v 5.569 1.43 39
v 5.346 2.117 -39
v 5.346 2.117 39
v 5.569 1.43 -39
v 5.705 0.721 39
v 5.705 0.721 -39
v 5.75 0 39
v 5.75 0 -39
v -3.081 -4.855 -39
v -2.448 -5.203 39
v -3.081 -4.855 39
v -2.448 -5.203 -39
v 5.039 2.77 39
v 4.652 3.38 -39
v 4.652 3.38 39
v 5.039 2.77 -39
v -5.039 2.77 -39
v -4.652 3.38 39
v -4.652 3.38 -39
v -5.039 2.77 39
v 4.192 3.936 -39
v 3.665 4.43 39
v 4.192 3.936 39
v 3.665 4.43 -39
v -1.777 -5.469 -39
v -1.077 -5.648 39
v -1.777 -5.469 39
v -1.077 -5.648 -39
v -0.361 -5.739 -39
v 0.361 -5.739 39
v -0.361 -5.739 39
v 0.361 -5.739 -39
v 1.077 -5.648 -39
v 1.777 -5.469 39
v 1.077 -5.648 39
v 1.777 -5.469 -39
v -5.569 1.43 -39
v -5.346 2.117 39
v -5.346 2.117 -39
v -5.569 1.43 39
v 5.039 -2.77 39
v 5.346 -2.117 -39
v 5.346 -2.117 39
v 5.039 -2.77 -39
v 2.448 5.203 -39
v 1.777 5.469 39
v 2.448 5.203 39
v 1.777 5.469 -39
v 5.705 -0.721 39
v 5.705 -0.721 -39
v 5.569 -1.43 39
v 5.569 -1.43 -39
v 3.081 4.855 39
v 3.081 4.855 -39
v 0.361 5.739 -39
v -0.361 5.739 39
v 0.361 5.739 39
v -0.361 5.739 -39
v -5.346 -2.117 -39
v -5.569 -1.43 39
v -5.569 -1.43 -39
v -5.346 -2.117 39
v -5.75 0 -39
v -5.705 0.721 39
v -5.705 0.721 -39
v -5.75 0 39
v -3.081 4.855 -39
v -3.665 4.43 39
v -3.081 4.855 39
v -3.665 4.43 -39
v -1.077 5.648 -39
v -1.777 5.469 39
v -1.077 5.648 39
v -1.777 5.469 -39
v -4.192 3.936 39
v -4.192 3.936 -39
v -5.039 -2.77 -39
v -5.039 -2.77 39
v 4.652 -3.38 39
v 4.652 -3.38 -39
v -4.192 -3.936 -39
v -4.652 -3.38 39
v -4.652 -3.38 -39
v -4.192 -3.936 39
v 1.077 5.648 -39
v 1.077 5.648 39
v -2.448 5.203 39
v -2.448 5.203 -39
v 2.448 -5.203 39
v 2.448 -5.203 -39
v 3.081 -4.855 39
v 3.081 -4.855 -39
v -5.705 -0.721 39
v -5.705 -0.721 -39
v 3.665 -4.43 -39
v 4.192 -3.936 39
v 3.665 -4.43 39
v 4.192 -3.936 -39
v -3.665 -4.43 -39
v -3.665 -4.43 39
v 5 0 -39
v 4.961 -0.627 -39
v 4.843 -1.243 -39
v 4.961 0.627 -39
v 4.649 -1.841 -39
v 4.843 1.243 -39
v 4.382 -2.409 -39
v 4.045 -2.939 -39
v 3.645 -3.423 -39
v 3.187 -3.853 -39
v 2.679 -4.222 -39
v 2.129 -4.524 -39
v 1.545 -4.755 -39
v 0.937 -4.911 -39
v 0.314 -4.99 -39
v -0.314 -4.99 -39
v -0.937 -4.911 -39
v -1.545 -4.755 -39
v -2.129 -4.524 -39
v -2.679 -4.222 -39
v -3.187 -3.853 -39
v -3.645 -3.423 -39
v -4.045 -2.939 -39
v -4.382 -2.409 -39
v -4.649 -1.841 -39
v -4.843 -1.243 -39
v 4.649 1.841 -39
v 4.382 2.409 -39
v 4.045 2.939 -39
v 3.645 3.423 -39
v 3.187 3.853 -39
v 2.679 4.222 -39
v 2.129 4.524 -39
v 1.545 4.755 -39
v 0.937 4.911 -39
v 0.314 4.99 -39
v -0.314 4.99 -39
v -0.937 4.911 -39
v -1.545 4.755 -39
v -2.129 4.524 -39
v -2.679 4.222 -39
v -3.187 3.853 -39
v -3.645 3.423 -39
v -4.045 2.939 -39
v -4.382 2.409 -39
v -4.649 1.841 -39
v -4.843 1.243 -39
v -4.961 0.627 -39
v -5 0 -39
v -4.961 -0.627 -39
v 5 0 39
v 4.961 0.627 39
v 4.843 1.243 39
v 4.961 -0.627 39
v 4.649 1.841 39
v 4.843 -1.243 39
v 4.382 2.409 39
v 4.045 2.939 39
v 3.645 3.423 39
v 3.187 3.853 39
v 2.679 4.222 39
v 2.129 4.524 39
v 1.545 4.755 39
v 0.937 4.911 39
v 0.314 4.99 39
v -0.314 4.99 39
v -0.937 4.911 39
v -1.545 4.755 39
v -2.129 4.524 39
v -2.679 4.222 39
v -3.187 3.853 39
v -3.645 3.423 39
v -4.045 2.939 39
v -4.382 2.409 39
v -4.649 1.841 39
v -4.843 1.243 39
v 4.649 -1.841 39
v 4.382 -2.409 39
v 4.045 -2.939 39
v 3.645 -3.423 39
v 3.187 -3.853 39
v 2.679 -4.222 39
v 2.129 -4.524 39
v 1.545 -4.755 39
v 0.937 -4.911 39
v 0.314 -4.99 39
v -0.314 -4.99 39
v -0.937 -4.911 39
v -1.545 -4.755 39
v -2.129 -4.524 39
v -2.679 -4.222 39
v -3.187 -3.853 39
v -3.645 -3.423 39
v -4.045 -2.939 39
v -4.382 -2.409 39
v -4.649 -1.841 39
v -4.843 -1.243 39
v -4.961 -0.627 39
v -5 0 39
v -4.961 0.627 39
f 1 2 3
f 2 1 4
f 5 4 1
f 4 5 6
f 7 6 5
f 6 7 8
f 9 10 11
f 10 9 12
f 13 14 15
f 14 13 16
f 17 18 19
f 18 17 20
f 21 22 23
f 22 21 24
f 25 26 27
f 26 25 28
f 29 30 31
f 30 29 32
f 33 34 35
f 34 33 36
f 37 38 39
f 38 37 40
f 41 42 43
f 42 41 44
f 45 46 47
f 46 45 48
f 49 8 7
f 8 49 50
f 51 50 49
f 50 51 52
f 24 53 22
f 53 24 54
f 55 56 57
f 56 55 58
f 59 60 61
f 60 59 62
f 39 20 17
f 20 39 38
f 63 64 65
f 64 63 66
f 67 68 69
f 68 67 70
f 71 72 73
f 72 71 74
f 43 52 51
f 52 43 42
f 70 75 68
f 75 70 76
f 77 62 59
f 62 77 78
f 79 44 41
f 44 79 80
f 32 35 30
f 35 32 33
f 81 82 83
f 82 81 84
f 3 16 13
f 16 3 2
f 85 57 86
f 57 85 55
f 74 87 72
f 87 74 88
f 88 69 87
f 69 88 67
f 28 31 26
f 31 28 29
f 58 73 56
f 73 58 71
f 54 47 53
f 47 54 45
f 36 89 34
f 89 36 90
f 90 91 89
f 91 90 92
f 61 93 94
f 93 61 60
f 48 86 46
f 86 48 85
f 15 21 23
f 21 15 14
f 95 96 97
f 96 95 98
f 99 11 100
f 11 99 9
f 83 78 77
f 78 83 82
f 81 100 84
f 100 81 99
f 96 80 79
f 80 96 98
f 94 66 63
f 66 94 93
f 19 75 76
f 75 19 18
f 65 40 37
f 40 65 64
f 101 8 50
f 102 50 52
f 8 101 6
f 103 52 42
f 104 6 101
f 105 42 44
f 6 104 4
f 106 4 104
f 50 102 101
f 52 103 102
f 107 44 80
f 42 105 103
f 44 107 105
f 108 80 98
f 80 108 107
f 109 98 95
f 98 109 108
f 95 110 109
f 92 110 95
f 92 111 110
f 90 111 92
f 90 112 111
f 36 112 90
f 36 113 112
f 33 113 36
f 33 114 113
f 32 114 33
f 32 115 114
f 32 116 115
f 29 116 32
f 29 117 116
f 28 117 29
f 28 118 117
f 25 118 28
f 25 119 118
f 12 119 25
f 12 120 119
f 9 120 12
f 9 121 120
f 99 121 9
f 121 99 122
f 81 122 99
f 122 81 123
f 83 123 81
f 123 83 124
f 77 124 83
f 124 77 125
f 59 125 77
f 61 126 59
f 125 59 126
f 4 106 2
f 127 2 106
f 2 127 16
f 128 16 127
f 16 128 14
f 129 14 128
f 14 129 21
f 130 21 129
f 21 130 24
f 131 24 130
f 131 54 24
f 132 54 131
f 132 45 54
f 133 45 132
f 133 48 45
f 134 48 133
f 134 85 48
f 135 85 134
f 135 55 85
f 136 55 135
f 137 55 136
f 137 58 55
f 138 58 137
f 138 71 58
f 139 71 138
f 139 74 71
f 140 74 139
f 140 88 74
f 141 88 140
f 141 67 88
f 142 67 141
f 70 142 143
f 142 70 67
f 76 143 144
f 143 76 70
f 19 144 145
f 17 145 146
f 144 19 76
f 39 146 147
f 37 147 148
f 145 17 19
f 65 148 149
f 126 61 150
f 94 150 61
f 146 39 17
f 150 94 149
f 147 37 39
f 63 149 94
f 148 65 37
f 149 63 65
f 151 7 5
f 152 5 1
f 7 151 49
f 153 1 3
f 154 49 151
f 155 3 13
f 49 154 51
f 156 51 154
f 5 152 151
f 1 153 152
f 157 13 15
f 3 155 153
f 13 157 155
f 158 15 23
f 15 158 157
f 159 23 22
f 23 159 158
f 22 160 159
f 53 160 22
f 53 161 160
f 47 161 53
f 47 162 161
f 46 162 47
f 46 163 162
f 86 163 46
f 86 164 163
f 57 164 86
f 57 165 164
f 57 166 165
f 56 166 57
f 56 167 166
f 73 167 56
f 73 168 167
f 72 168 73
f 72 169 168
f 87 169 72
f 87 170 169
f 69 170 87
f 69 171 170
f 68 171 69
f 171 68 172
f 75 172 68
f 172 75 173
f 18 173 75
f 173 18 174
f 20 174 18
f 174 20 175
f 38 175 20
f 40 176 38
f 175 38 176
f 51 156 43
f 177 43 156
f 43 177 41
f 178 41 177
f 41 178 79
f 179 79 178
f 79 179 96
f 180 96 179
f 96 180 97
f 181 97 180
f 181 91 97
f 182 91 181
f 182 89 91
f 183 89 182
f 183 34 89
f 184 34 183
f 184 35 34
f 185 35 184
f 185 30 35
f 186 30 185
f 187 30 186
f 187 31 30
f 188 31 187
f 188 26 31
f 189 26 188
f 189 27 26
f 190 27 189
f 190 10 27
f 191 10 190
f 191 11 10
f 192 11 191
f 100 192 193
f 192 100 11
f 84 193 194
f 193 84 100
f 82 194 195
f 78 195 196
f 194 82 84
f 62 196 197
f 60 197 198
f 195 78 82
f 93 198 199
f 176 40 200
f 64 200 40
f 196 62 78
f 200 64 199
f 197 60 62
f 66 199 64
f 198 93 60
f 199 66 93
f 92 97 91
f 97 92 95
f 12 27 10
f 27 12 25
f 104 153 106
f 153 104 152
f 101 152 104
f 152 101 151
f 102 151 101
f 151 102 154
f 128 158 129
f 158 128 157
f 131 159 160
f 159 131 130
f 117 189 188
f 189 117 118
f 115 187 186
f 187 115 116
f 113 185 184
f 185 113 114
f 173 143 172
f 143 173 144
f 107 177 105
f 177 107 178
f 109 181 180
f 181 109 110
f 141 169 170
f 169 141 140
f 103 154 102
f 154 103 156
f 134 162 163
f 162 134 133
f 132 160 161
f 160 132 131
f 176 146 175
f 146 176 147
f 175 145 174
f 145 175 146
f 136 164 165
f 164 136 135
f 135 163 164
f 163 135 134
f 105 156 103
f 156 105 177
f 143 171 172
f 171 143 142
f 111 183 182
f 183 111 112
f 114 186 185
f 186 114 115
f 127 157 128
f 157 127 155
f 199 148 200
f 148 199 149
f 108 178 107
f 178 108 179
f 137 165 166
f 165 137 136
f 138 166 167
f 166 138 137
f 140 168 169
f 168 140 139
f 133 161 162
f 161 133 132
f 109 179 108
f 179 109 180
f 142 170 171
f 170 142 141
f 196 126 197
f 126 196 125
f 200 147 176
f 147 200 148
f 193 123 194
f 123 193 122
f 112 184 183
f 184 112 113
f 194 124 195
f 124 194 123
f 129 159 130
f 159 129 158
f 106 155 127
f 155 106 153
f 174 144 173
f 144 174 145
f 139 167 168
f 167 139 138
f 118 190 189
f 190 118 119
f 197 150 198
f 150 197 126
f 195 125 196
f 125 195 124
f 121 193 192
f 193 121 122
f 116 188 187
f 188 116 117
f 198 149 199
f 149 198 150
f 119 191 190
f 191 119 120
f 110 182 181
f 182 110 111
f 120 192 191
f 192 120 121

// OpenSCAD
$fn = 50;


difference() {
	union() {
		translate(v = [0, 0, -39.0000000000]) {
			cylinder(h = 78, r = 5.7500000000);
		}
	}
	union() {
		translate(v = [0, 0, -100.0000000000]) {
			cylinder(h = 200, r = 5.0000000000);
		}
	}
}
